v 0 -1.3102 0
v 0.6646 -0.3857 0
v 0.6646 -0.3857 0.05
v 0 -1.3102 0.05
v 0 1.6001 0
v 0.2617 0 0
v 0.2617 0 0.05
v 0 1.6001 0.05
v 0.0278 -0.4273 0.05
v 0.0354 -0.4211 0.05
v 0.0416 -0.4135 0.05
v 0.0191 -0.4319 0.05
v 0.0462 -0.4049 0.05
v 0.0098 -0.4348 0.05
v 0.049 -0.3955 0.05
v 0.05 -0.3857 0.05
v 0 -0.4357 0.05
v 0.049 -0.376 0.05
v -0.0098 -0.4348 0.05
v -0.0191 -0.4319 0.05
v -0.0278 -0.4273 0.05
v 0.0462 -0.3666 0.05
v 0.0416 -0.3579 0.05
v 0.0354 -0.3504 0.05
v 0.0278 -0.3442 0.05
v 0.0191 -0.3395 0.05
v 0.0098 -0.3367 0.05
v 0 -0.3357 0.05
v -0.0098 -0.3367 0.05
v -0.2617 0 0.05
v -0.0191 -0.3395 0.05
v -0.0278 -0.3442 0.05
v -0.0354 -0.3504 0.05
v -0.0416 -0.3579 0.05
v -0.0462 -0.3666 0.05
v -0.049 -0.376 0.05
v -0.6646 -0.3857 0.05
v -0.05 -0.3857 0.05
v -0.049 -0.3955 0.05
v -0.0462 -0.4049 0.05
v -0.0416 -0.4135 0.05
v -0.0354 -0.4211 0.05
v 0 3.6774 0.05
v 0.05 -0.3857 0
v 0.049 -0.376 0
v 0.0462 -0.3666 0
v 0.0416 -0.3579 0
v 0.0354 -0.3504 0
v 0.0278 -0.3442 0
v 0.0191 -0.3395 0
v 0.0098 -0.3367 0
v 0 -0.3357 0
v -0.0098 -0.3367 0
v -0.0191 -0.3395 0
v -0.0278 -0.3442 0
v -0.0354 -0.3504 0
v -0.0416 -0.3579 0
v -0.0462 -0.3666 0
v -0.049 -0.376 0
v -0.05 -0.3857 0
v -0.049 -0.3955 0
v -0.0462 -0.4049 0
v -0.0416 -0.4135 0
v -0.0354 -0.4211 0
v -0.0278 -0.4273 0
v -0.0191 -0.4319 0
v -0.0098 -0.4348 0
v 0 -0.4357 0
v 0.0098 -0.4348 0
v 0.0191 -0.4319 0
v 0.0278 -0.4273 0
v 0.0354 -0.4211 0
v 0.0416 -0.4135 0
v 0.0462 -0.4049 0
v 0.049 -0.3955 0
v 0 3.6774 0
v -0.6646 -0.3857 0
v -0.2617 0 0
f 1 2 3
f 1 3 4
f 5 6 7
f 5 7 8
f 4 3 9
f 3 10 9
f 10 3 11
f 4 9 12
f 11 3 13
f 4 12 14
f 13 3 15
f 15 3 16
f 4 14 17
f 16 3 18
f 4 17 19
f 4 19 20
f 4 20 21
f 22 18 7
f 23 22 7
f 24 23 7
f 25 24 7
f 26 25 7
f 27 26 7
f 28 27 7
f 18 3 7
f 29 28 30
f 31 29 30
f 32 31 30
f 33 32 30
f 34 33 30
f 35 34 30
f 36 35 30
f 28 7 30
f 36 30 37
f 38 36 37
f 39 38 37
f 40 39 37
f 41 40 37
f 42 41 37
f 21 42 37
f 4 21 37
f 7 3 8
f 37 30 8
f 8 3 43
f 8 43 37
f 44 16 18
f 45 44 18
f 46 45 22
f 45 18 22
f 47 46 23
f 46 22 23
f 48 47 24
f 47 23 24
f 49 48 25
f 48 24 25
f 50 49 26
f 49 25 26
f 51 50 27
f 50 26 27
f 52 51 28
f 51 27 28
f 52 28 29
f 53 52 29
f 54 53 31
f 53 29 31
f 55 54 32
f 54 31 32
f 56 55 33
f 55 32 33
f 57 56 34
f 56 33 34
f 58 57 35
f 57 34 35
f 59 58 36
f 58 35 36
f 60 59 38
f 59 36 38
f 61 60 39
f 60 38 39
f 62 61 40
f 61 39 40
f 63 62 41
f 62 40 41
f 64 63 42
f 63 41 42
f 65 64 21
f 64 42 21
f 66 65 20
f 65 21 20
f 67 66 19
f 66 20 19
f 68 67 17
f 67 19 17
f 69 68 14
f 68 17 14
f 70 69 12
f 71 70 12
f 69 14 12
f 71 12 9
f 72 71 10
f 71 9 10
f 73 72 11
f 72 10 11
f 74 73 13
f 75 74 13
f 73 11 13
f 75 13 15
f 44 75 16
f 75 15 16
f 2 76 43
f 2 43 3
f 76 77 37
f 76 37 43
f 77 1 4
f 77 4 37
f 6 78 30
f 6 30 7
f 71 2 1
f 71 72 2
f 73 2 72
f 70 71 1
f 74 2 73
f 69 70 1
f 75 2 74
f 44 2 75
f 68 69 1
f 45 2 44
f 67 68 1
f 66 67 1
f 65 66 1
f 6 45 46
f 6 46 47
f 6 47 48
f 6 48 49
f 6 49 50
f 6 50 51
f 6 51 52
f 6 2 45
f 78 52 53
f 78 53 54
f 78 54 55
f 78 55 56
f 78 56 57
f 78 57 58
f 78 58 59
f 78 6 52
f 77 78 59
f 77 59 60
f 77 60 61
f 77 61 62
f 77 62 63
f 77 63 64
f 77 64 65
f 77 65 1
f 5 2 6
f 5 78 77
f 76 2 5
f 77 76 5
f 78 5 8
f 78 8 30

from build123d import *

# Parameters (mm, degrees)
BOSS_EXTRUDE1_DEPTH = 0.05
SKETCH2_R           = 0.05
CUT_EXTRUDE1_DEPTH  = 0.05


with BuildPart() as part:
    # Sketch1 → Boss-Extrude1 (new body)
    with BuildSketch(Plane.XY):
        Polygon((0, 3.67739105), (0.664568148, -0.385728496), (0, -1.310201981), (-0.664568148, -0.385728496), align=None)
        Polygon((-0.261710049, 0), (0.261710049, 0), (0, 1.600075505), align=None, mode=Mode.SUBTRACT)
    extrude(amount=BOSS_EXTRUDE1_DEPTH)

    # Sketch2 → Cut-Extrude1 (cut)
    with BuildSketch(Plane.XY.offset(0.05)):
        with Locations((0, -0.385728496)):
            Circle(SKETCH2_R)
    extrude(amount=-CUT_EXTRUDE1_DEPTH, mode=Mode.SUBTRACT)


solid = part.part
